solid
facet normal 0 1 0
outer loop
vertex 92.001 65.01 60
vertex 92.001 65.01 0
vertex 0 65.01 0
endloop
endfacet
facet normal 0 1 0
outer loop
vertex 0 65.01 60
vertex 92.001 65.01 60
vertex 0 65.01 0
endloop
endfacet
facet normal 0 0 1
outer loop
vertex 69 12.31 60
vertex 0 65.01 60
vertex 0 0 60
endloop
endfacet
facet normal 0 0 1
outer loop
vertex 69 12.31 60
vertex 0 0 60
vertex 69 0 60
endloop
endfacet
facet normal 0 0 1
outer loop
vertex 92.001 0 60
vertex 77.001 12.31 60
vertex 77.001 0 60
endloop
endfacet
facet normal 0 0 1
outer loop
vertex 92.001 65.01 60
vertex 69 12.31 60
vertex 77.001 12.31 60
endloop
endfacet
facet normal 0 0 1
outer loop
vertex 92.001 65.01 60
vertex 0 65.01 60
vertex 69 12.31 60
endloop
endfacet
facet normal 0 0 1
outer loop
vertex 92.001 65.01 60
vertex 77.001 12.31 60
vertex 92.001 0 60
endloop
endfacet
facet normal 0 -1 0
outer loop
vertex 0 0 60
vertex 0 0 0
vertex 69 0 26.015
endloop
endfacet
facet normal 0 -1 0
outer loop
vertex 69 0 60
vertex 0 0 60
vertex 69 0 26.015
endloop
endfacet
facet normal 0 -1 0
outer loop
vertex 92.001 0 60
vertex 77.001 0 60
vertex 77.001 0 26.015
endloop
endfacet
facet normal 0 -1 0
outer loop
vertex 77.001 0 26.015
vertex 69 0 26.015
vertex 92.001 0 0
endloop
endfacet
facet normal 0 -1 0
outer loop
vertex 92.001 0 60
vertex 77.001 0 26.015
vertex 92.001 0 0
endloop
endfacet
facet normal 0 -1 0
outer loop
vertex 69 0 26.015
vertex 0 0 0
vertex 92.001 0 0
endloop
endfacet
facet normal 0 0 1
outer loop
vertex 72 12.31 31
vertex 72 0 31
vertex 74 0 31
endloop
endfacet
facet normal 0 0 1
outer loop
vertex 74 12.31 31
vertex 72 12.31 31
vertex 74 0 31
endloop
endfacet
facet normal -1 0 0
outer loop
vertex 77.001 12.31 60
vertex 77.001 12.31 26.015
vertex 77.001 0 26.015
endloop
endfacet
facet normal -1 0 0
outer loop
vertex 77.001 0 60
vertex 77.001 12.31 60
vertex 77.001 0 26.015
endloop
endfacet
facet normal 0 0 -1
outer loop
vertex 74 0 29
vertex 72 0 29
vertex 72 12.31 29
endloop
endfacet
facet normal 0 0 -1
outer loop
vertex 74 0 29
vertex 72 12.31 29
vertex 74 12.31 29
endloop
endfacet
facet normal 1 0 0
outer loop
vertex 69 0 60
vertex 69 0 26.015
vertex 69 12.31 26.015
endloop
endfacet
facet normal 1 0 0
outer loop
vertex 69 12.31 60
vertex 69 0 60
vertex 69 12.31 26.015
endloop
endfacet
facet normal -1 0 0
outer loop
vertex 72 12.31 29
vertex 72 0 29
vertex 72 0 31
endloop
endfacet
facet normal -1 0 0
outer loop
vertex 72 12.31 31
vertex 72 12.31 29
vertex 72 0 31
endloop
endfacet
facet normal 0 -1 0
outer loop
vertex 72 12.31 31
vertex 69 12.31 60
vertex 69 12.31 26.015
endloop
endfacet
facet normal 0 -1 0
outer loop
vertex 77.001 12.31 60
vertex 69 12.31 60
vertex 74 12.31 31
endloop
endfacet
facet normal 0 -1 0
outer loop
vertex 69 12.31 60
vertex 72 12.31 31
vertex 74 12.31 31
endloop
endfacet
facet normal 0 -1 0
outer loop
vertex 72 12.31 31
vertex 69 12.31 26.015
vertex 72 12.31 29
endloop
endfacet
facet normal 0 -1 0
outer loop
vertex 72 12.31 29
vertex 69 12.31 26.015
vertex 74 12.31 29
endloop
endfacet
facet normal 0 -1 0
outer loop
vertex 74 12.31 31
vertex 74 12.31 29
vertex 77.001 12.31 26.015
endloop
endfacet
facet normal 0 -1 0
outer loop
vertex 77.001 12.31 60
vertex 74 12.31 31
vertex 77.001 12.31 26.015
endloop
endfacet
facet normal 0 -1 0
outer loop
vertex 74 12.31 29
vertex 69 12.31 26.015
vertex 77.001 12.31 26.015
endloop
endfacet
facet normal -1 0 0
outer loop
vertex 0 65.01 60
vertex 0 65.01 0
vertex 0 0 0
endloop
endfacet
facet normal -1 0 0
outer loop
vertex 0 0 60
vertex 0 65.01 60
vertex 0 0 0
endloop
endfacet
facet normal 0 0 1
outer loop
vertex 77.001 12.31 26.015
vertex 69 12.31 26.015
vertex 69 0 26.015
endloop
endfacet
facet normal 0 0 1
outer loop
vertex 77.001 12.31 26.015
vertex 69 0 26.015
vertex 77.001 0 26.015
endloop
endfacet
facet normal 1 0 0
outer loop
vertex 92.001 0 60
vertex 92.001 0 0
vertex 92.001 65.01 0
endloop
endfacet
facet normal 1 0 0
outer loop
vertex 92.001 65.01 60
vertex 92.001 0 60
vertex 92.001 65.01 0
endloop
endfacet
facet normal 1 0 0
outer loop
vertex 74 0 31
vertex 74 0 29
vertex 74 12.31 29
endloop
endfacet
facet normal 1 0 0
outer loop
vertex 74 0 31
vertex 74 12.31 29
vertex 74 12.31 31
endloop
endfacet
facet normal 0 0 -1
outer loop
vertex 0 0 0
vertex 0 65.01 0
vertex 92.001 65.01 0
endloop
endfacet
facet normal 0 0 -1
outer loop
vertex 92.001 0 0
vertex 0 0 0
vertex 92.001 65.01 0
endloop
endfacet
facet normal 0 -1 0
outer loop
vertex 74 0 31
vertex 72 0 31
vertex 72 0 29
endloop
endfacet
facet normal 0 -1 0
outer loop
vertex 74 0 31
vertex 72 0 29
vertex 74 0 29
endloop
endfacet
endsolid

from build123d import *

# Parameters (mm, degrees)
BOSS_EXTRUDE1_DEPTH = 60
SKETCH1_6_W         = 8.001
SKETCH1_6_H         = 12.31
BOSS_EXTRUDE3_DEPTH = 26.01546
SKETCH2_W           = 2
SKETCH2_H           = 2
BOSS_EXTRUDE4_DEPTH = 12.31


with BuildPart() as part:
    # Sketch1 → Boss-Extrude1 (new body)
    with BuildSketch(Plane.XY):
        Polygon((77.001, 12.31), (77.001, 0), (92.001, 0), (92.001, 65.01), (0, 65.01), (0, 0), (69, 0), (69, 12.31), align=None)
    extrude(amount=BOSS_EXTRUDE1_DEPTH)

    # Sketch1<6> → Boss-Extrude3 (add)
    with BuildSketch(Plane.XY):
        with Locations((73.0005, 6.155)):
            Rectangle(SKETCH1_6_W, SKETCH1_6_H)
    extrude(amount=BOSS_EXTRUDE3_DEPTH)

    # Sketch2 → Boss-Extrude4 (add)
    with BuildSketch(Plane.XZ):
        with Locations((73.0005, 30.00046)):
            Rectangle(SKETCH2_W, SKETCH2_H)
    extrude(amount=-BOSS_EXTRUDE4_DEPTH)


solid = part.part
